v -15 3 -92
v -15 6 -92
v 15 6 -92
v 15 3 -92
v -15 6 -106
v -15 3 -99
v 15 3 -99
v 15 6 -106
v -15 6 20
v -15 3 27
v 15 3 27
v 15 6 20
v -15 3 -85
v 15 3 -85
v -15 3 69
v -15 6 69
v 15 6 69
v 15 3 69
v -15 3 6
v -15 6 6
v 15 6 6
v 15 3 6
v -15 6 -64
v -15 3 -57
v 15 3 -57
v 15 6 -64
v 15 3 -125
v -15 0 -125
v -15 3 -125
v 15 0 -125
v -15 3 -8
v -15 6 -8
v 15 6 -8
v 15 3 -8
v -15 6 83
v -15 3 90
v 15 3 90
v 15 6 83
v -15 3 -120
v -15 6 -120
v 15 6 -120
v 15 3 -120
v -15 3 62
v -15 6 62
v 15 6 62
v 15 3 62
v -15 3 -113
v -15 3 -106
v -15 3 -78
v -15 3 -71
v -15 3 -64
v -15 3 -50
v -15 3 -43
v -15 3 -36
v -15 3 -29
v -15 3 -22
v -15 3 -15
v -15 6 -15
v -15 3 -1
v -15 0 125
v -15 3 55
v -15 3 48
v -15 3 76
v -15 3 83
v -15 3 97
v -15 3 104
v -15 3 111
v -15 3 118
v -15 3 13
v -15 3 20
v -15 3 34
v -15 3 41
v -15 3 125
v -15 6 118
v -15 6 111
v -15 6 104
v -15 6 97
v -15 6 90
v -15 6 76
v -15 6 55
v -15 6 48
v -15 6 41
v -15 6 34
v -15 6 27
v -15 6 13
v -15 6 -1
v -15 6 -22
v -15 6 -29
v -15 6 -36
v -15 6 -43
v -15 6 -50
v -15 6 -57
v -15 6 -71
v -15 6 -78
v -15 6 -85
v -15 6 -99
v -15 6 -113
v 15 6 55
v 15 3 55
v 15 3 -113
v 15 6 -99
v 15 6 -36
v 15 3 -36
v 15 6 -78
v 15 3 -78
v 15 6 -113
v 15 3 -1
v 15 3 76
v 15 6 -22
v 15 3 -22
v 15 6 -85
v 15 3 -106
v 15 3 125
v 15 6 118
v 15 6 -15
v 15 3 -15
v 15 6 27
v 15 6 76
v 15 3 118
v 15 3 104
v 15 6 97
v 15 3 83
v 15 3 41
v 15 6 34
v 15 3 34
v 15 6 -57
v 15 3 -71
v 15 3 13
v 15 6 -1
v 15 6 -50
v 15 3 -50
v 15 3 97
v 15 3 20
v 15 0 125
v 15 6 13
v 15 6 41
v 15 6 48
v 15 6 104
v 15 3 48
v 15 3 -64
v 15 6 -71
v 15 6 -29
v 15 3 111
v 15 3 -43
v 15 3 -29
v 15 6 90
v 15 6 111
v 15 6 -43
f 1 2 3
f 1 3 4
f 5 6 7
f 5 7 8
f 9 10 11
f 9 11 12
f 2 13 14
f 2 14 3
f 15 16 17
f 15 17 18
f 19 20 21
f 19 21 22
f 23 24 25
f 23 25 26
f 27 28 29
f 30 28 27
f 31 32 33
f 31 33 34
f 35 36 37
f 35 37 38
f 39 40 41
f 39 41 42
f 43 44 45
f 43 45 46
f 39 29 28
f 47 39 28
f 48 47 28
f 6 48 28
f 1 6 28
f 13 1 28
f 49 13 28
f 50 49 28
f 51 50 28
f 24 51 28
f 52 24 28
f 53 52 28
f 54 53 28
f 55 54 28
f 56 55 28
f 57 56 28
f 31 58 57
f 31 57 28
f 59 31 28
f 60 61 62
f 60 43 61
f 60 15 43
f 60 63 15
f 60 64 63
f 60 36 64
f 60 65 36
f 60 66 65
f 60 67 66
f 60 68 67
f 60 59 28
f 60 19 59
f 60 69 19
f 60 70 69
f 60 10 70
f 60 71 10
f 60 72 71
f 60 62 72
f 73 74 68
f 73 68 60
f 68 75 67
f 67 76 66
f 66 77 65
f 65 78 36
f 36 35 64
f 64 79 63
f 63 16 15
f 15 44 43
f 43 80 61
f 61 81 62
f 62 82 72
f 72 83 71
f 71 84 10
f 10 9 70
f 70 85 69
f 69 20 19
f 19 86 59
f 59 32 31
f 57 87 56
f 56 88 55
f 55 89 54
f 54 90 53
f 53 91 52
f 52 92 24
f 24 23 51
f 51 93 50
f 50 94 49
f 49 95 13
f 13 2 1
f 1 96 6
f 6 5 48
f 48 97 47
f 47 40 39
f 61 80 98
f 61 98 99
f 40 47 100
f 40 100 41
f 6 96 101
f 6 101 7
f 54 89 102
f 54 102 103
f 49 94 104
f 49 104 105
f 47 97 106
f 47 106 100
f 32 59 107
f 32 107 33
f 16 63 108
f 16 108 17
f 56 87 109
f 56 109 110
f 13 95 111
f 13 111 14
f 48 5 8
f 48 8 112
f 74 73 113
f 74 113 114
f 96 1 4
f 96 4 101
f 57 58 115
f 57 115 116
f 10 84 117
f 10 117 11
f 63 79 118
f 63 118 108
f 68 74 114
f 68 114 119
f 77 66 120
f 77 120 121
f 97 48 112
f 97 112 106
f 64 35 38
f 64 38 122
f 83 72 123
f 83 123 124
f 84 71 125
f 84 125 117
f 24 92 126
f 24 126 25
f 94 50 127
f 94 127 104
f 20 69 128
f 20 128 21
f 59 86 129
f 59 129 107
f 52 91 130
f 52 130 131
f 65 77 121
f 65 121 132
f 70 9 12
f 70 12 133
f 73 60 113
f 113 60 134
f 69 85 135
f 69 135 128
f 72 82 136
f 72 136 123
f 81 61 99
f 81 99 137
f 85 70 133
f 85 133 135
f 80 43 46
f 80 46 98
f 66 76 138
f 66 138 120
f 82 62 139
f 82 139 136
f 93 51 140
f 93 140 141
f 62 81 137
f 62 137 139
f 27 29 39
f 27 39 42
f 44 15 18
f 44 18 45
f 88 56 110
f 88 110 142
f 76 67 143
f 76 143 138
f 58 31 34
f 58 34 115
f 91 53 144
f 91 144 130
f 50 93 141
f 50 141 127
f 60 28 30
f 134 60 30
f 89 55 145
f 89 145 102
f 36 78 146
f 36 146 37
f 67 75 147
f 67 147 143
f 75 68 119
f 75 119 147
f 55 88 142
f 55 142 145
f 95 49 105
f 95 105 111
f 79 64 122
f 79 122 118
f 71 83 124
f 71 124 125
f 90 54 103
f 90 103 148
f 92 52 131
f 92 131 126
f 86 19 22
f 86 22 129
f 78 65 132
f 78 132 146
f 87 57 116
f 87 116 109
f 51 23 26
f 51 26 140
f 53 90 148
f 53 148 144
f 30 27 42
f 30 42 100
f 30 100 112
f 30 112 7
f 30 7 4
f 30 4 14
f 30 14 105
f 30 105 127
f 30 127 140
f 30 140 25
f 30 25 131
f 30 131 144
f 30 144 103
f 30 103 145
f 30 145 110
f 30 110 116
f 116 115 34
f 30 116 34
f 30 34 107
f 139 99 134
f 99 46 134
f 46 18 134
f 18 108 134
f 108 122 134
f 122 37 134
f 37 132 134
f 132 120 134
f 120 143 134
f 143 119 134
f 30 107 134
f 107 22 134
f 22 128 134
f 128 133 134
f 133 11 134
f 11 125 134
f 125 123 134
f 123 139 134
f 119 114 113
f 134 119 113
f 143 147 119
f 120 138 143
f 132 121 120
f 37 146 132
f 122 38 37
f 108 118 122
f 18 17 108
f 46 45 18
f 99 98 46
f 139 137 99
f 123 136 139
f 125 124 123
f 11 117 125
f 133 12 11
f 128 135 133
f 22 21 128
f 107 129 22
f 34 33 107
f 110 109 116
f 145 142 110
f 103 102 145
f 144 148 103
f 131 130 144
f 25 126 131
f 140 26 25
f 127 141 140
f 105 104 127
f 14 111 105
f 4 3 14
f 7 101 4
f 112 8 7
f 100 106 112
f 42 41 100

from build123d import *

# Parameters (mm, degrees)
SKETCH_1_W             = 30
SKETCH_1_H             = 250
EXTRUDE_1_DEPTH        = 3
EXTRUDE_2_DEPTH        = 15
PATTERN_LINEAR_1_COUNT = 35
PATTERN_LINEAR_1_PITCH = 7


with BuildPart() as part:
    # 스케치1 → 보스-돌출1 (new body)
    with BuildSketch(Plane(origin=(0, 0, 0), x_dir=(1, 0, 0), z_dir=(0, 1, 0))):
        Rectangle(SKETCH_1_W, SKETCH_1_H)
    extrude(amount=EXTRUDE_1_DEPTH)

    # 스케치3 → 보스-돌출2 (add, symmetric)
    with BuildSketch(Plane(origin=(0, 0, 0), x_dir=(0, 0, -1), z_dir=(1, 0, 0))):
        Polygon((-125, 3), (-118, 6), (-118, 3), align=None)
    extrude_2 = extrude(amount=EXTRUDE_2_DEPTH, both=True)

    # 선형 패턴1: 보스-돌출2 ×35
    with Locations(*[(0, 0, -i * PATTERN_LINEAR_1_PITCH) for i in range(1, PATTERN_LINEAR_1_COUNT)]):
        add(extrude_2)


solid = part.part
